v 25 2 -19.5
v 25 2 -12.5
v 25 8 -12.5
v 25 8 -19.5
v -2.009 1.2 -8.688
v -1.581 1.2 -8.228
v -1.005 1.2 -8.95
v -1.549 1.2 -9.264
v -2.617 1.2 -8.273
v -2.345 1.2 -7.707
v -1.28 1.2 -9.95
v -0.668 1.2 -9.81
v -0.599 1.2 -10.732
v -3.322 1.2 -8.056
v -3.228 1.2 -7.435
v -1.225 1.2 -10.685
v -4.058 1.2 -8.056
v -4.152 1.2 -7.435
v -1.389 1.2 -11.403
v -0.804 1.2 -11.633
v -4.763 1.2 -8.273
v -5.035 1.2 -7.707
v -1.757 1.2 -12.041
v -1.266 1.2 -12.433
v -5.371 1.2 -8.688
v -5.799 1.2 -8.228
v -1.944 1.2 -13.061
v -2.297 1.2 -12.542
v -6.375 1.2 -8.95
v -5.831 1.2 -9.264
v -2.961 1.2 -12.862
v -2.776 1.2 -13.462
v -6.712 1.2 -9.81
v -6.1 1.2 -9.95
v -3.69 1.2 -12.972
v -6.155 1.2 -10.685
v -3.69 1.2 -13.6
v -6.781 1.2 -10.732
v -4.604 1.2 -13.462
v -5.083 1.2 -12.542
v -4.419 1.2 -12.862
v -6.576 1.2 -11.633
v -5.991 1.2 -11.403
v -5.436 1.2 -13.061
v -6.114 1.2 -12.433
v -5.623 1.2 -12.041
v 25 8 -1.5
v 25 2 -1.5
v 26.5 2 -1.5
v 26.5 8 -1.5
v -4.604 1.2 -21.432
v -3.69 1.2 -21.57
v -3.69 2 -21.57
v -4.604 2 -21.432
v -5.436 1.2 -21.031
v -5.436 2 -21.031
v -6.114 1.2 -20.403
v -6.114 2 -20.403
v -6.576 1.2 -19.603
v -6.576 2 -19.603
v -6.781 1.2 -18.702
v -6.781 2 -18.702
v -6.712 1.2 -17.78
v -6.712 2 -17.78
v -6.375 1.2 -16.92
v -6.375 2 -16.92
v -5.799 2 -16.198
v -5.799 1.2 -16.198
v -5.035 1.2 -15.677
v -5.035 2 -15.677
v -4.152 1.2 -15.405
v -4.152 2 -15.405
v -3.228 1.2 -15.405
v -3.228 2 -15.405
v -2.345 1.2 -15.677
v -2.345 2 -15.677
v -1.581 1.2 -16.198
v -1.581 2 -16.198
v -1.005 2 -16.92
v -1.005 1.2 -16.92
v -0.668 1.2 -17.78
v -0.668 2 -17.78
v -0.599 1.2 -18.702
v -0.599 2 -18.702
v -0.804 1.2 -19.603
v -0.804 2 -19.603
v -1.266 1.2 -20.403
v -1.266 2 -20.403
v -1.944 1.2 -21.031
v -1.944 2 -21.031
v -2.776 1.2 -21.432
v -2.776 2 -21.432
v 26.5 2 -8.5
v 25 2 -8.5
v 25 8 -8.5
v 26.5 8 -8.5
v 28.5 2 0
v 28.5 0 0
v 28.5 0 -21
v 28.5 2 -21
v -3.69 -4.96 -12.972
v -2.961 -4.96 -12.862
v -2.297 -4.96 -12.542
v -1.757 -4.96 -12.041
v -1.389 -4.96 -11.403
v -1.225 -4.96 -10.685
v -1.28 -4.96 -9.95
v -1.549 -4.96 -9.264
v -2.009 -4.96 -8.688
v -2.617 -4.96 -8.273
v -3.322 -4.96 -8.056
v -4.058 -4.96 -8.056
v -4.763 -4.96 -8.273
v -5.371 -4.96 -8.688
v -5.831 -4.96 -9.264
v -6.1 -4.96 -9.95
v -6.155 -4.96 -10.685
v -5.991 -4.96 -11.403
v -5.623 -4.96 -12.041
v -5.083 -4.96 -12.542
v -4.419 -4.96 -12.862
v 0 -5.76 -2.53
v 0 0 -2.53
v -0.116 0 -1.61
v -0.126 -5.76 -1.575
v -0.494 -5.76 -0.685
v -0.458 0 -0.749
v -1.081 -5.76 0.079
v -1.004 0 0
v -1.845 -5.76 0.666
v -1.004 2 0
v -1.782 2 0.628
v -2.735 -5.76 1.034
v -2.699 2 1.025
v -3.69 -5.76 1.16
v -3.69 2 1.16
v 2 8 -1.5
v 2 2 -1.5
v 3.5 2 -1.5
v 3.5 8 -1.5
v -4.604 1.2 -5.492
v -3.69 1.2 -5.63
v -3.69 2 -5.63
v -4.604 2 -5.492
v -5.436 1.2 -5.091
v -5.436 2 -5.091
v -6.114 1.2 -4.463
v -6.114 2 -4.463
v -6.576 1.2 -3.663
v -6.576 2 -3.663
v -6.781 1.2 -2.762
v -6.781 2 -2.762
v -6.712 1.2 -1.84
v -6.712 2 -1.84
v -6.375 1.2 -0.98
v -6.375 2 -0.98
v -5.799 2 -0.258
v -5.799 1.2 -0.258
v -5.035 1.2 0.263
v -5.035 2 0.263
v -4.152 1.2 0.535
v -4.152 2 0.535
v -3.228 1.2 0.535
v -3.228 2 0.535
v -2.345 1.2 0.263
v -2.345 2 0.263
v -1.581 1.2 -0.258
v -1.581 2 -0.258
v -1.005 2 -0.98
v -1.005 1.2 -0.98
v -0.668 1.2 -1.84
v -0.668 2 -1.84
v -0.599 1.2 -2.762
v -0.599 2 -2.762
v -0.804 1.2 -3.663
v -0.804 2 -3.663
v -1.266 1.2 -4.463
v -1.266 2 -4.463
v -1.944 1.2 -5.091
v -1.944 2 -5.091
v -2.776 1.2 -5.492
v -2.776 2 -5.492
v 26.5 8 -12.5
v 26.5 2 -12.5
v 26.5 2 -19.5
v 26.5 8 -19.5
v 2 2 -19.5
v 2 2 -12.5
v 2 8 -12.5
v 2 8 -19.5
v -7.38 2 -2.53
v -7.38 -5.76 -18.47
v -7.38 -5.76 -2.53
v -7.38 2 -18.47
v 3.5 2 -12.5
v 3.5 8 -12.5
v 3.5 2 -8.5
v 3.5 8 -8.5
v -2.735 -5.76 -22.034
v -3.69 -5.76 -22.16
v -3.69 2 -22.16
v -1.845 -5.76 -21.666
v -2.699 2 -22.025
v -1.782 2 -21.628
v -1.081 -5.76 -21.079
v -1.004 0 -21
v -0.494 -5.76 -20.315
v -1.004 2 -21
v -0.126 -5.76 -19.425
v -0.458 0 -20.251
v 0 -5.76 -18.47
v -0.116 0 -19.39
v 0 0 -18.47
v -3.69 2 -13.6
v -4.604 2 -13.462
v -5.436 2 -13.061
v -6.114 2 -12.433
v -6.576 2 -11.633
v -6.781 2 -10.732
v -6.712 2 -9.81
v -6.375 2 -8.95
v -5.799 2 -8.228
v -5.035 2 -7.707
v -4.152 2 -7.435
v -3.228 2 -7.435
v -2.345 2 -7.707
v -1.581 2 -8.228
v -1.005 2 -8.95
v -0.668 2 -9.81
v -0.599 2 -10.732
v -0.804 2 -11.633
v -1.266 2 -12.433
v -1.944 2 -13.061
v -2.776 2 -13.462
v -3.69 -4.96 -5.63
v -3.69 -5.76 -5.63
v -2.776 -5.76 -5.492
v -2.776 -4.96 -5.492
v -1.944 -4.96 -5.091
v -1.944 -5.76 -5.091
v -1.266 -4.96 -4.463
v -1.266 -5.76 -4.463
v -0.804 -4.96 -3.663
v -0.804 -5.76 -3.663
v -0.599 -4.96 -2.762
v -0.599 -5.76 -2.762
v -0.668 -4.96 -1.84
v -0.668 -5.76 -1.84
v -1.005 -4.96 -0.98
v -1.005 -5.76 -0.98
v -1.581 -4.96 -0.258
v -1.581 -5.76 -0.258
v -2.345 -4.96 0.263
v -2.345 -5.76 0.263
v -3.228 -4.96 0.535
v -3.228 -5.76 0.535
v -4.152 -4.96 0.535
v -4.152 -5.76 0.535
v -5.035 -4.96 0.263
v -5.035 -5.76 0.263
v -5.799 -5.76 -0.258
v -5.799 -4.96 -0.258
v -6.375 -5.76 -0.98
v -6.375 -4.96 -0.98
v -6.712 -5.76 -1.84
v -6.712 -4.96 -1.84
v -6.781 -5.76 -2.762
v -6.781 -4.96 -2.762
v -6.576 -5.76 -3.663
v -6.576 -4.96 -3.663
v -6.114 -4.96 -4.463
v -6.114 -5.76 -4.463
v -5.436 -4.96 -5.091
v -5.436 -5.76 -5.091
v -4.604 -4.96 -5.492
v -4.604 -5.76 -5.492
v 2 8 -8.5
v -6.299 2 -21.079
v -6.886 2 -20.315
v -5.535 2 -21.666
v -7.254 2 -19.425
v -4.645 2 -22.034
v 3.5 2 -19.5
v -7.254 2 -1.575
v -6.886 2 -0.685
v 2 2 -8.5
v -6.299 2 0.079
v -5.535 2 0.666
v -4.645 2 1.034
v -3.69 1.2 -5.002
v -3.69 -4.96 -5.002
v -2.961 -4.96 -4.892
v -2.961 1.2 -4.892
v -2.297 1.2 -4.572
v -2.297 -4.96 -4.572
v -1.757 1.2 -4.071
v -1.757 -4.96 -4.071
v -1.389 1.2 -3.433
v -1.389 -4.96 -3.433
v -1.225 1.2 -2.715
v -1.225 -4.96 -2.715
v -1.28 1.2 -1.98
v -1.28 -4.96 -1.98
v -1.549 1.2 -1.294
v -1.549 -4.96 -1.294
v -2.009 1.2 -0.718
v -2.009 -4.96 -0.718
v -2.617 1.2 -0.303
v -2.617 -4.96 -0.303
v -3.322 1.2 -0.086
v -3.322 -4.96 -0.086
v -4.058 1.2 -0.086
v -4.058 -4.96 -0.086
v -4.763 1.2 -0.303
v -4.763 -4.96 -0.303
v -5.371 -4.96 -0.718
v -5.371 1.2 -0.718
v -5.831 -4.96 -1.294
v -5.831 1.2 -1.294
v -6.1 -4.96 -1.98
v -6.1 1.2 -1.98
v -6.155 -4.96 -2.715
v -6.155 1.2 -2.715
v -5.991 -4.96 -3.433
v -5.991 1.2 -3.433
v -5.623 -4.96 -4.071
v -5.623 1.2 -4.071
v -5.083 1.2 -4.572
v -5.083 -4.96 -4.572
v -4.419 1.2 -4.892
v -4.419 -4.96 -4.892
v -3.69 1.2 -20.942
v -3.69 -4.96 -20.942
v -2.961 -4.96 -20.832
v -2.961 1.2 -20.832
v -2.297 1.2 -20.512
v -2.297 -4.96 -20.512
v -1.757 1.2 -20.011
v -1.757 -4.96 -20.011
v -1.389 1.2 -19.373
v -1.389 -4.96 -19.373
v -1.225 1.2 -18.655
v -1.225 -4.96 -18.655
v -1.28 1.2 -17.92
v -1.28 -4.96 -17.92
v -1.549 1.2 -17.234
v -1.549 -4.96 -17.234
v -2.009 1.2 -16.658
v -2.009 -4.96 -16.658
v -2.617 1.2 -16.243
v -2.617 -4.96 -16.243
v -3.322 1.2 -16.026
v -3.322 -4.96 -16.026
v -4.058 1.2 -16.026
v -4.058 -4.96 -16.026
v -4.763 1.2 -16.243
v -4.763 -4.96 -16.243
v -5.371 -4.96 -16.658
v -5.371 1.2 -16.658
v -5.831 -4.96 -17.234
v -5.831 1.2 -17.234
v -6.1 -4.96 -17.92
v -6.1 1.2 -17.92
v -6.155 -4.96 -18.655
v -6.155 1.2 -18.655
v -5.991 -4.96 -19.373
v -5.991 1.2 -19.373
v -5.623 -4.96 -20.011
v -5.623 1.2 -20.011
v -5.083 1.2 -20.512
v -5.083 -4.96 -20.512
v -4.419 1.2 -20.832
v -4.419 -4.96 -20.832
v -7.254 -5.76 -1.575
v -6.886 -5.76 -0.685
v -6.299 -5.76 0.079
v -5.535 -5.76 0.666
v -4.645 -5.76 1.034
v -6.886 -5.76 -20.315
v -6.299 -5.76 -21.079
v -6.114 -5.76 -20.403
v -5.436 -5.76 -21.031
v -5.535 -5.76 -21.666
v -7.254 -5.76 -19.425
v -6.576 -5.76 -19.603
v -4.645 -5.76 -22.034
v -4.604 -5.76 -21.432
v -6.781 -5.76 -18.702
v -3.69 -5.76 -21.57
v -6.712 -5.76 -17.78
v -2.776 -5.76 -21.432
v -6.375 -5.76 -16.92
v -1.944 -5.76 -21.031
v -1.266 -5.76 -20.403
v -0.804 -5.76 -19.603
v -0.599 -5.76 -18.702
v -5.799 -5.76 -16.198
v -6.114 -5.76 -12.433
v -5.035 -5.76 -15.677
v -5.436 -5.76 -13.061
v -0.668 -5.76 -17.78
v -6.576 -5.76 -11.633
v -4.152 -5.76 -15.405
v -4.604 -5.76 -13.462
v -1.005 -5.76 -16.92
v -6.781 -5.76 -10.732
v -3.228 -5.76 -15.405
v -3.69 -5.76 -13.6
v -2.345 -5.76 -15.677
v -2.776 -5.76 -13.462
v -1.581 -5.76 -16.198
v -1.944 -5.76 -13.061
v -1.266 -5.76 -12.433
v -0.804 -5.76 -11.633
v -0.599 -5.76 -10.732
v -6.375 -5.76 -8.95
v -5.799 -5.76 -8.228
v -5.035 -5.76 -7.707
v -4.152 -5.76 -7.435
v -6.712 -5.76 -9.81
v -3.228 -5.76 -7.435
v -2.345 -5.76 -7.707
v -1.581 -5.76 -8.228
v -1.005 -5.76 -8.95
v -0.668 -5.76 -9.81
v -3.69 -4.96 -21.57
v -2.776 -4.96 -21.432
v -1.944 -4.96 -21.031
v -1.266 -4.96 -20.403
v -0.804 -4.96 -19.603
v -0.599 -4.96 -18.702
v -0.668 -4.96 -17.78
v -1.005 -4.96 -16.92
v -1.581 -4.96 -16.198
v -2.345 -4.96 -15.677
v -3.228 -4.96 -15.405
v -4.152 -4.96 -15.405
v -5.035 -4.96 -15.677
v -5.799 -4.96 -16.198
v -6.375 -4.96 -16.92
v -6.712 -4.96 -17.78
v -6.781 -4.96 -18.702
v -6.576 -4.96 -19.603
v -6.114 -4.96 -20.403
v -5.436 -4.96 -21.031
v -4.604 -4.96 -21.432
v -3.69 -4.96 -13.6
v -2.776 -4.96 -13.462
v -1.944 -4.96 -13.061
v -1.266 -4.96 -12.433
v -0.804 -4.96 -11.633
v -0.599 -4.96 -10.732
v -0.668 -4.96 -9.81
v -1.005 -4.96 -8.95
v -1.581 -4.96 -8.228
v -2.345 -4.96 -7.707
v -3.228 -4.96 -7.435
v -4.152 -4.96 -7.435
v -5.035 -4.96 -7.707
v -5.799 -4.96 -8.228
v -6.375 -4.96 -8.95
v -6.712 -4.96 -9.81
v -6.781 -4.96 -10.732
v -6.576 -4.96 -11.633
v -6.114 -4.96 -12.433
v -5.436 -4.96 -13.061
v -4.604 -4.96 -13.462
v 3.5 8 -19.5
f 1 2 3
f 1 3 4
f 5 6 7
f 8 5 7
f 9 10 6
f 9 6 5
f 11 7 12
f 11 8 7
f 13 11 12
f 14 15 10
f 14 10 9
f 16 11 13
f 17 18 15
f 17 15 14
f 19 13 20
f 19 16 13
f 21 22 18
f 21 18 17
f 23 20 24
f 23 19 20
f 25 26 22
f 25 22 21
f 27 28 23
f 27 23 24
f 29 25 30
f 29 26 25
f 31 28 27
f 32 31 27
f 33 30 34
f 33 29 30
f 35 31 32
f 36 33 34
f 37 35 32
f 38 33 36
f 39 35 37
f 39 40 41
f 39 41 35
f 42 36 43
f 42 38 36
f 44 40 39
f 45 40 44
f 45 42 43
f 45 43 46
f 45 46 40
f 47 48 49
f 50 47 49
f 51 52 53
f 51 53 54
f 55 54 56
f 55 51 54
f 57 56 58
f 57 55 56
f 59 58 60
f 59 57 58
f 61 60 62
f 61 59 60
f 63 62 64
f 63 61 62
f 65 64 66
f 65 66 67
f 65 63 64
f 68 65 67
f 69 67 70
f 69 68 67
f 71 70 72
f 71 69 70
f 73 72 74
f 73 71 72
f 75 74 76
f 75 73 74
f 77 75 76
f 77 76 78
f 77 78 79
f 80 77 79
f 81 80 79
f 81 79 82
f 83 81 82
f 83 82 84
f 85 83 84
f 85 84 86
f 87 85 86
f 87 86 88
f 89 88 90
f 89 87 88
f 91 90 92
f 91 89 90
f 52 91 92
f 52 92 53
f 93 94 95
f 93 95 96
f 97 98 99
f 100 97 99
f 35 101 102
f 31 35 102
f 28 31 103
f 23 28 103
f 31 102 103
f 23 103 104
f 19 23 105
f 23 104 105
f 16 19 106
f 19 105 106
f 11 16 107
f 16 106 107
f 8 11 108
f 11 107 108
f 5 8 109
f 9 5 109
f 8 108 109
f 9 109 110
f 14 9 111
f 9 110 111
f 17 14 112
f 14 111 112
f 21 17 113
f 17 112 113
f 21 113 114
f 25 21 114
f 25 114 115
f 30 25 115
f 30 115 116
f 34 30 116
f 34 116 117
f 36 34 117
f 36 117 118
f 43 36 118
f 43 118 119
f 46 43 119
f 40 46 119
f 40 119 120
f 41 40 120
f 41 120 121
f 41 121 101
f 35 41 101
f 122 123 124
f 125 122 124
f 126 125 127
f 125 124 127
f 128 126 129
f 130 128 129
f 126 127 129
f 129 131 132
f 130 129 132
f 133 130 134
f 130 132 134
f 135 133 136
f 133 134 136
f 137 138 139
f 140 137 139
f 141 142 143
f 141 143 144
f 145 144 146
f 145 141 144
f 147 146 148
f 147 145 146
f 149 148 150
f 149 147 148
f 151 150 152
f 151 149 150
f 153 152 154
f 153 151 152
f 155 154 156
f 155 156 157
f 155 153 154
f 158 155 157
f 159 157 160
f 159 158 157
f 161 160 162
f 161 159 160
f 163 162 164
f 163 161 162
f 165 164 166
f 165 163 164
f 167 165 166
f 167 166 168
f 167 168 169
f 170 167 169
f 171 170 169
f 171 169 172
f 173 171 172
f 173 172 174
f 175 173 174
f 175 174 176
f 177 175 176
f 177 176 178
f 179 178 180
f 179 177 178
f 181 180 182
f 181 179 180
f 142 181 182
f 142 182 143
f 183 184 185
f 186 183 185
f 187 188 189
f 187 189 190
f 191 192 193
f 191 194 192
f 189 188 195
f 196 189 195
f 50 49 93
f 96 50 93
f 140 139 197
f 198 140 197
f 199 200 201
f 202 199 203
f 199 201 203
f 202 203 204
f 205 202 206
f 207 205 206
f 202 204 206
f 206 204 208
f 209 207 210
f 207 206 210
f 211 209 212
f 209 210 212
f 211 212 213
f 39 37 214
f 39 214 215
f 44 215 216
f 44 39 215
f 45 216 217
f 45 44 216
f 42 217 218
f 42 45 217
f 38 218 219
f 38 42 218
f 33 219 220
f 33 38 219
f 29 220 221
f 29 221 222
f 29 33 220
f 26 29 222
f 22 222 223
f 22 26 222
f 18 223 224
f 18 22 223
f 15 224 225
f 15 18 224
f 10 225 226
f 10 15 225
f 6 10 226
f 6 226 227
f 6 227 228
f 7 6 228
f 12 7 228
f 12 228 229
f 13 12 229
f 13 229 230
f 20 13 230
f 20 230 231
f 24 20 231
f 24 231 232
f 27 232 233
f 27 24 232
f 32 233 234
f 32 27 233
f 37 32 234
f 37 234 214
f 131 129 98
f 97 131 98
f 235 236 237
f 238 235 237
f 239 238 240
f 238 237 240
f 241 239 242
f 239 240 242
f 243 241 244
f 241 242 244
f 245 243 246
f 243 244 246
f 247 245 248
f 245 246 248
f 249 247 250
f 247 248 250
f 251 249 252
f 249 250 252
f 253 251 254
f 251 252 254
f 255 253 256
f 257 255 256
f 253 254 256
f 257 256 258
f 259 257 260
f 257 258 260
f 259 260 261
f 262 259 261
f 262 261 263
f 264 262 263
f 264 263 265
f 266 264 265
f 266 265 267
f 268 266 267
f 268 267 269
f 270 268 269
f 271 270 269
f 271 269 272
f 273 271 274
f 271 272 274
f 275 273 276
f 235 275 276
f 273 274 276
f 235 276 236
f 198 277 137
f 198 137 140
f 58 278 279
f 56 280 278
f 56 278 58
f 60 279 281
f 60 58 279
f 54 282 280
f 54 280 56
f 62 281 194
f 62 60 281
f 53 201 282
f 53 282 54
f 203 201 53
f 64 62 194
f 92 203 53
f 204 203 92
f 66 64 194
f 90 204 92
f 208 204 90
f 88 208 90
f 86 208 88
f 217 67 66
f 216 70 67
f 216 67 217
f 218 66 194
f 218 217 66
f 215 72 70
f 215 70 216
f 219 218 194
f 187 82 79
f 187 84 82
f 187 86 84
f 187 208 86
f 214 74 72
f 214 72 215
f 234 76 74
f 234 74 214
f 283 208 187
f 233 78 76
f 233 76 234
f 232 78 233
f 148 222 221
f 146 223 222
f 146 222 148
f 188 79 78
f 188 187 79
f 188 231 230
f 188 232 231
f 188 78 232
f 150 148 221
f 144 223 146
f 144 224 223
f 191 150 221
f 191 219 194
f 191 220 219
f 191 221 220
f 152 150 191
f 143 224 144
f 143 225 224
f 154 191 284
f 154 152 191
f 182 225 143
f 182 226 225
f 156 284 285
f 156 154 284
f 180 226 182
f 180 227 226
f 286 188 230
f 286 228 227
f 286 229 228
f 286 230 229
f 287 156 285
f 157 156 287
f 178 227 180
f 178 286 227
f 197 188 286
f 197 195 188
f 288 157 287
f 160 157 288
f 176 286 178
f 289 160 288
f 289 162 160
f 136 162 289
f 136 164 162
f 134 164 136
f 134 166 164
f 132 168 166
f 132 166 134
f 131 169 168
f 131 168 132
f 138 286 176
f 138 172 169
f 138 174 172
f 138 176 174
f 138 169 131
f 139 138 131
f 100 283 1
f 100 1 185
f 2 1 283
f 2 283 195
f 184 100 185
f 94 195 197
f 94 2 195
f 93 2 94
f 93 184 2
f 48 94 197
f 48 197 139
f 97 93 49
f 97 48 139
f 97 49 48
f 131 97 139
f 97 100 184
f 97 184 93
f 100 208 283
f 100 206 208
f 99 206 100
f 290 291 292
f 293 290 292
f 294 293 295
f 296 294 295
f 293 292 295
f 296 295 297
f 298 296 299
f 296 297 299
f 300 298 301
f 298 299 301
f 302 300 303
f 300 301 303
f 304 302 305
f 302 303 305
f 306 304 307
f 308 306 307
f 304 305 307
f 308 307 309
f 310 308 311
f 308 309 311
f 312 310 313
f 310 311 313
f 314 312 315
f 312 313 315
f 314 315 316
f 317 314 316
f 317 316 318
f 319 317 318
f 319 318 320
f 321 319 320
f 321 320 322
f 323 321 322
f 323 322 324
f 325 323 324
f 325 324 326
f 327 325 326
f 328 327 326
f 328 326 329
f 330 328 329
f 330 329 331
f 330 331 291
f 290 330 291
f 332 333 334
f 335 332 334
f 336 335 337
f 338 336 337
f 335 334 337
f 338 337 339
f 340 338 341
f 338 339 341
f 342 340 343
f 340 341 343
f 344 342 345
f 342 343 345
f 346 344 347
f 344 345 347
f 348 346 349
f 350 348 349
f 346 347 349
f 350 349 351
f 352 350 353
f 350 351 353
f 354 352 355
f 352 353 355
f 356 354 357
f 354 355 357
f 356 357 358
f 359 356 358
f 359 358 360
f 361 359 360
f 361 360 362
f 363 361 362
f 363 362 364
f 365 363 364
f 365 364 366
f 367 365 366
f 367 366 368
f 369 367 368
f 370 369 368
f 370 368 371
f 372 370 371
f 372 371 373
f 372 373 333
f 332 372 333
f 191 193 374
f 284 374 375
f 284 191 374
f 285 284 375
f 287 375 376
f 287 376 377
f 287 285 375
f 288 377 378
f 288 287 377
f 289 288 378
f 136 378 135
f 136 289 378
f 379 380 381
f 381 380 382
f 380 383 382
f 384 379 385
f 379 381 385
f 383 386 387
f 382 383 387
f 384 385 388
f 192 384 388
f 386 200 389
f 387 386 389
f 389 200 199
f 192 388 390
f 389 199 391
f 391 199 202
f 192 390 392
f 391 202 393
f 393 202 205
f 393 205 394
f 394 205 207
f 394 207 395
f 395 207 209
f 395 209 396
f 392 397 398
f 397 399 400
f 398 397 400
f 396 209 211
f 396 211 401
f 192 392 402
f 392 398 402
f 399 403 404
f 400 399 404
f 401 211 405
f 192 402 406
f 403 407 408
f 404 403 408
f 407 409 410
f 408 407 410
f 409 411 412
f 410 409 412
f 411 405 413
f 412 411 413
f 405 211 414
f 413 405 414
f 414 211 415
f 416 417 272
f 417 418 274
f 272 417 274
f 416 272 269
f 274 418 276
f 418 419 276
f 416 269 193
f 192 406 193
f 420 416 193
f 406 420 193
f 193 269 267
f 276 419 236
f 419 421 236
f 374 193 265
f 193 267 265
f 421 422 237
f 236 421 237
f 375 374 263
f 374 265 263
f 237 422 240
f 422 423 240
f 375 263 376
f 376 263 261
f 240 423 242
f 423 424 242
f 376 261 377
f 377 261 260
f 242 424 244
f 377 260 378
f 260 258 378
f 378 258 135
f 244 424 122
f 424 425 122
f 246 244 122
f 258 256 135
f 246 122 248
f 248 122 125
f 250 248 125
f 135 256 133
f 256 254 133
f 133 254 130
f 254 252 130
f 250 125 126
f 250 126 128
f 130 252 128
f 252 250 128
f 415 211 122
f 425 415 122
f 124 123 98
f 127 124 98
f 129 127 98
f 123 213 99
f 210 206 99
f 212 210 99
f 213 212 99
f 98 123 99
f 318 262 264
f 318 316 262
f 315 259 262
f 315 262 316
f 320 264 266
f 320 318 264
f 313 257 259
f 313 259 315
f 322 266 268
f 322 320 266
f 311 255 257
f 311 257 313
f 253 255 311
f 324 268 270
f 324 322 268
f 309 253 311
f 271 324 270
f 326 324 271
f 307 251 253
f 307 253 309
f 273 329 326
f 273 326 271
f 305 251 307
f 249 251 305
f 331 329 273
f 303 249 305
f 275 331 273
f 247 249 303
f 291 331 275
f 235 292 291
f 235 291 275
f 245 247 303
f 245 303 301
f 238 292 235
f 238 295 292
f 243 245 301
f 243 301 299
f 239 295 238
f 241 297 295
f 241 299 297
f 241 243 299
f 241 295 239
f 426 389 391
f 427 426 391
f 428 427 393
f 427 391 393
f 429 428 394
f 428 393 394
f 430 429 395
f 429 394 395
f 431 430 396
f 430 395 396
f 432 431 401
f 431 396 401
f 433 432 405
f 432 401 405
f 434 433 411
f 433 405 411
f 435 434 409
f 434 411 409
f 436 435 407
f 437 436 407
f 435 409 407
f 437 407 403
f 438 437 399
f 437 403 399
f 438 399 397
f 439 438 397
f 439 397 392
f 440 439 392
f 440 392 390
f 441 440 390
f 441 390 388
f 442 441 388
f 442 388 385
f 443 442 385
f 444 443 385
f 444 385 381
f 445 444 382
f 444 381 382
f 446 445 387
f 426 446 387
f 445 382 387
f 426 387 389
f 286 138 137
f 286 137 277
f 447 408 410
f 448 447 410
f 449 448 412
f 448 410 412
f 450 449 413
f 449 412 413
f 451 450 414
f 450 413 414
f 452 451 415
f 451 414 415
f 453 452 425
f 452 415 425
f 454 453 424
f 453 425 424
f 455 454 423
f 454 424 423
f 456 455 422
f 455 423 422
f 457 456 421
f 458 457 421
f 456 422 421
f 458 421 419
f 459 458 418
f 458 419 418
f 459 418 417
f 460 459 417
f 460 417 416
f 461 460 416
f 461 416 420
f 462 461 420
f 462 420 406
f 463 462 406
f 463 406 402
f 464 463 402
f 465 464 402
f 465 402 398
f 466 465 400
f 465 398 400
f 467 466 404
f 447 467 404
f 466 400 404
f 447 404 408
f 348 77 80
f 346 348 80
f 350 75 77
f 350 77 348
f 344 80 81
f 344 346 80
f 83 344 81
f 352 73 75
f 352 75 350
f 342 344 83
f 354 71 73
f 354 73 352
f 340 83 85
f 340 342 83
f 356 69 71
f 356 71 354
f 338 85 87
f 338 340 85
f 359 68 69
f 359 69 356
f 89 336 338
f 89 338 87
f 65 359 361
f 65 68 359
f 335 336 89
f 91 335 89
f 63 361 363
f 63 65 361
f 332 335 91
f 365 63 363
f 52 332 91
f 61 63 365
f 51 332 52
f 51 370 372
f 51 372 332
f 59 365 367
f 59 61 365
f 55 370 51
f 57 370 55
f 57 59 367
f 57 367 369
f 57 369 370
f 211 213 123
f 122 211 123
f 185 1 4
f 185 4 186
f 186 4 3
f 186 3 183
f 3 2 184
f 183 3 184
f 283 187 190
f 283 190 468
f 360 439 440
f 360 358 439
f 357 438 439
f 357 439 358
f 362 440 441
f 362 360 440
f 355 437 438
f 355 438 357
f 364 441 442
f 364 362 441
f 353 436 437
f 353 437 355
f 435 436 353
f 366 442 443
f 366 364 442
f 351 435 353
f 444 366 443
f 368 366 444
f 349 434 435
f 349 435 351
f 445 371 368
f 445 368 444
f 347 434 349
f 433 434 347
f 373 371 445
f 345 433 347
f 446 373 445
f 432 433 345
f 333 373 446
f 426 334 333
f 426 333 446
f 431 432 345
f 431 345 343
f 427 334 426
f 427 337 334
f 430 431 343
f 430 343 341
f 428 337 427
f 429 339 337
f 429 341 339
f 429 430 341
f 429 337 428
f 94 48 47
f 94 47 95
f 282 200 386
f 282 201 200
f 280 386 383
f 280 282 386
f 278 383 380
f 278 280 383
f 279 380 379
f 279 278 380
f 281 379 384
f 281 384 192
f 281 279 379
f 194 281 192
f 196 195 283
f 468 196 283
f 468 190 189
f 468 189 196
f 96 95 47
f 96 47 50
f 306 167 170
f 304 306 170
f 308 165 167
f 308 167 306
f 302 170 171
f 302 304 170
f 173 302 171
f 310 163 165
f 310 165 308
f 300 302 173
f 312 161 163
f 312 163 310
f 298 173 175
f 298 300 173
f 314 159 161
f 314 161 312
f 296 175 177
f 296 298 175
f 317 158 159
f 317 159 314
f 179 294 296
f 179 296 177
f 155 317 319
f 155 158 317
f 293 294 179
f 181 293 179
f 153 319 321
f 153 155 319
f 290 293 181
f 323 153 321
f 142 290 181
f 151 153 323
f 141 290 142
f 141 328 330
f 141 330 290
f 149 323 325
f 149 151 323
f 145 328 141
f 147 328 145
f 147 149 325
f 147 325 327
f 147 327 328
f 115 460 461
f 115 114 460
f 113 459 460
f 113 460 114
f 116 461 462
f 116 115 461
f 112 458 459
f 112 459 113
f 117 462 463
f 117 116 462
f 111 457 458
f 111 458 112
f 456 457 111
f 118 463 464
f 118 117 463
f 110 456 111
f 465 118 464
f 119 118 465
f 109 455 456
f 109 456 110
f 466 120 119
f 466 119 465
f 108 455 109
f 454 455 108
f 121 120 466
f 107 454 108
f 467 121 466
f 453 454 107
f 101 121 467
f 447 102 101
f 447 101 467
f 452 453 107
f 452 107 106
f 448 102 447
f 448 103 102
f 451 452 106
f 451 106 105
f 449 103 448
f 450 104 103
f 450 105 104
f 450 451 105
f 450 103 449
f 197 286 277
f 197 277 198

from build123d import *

# Parameters (mm, degrees)
SKETCH1_W           = 28.5
SKETCH1_H           = 21
BOSS_EXTRUDE1_DEPTH = 2
SKETCH2_W           = 1.5
SKETCH2_H           = 7
BOSS_EXTRUDE2_DEPTH = 6
SKETCH3_W           = 23.32
SKETCH3_H           = 7.76
BOSS_EXTRUDE3_DEPTH = 7.38
SKETCH4_R           = 2.472
CUT_EXTRUDE1_DEPTH  = 7.76
SKETCH5_R           = 3.1
CUT_EXTRUDE2_DEPTH  = 0.8
CUT_EXTRUDE3_START  = -0.8
SKETCH6_R           = 3.1
CUT_EXTRUDE3_DEPTH  = 0.8
FILLET1_R           = 3.69


with BuildPart() as part:
    # Sketch1 → Boss-Extrude1 (new body)
    with BuildSketch(Plane(origin=(0, 0, 0), x_dir=(1, 0, 0), z_dir=(0, 1, 0))):
        with Locations((14.25, 10.5)):
            Rectangle(SKETCH1_W, SKETCH1_H)
    extrude(amount=BOSS_EXTRUDE1_DEPTH)

    # Sketch2 → Boss-Extrude2 (add)
    with BuildSketch(Plane(origin=(0, 2, 0), x_dir=(1, 0, 0), z_dir=(0, 1, 0))):
        with Locations((2.75, 16)):
            Rectangle(SKETCH2_W, SKETCH2_H)
        with Locations((2.75, 5)):
            Rectangle(SKETCH2_W, SKETCH2_H)
        with Locations((25.75, 16)):
            Rectangle(SKETCH2_W, SKETCH2_H)
        with Locations((25.75, 5)):
            Rectangle(SKETCH2_W, SKETCH2_H)
    extrude(amount=BOSS_EXTRUDE2_DEPTH)

    # Sketch3 → Boss-Extrude3 (add)
    with BuildSketch(Plane.ZY):
        with Locations((-10.5, -1.88)):
            Rectangle(SKETCH3_W, SKETCH3_H)
    extrude(amount=BOSS_EXTRUDE3_DEPTH)

    # Sketch4 → Cut-Extrude1 (cut)
    with BuildSketch(Plane.XZ.offset(5.76)):
        with Locations(Location((-3.69, -2.53, 0), (0, 0, 270))):
            Circle(SKETCH4_R)
        with Locations(Location((-3.69, -10.5, 0), (0, 0, 270))):
            Circle(SKETCH4_R)
        with Locations(Location((-3.69, -18.47, 0), (0, 0, 270))):
            Circle(SKETCH4_R)
    extrude(amount=-CUT_EXTRUDE1_DEPTH, mode=Mode.SUBTRACT)

    # Sketch5 → Cut-Extrude2 (cut)
    with BuildSketch(Plane.XZ.offset(5.76)):
        with Locations(Location((-3.69, -2.53, 0), (0, 0, 270))):
            Circle(SKETCH5_R)
        with Locations(Location((-3.69, -10.5, 0), (0, 0, 270))):
            Circle(SKETCH5_R)
        with Locations(Location((-3.69, -18.47, 0), (0, 0, 270))):
            Circle(SKETCH5_R)
    extrude(amount=-CUT_EXTRUDE2_DEPTH, mode=Mode.SUBTRACT)

    # Sketch6 → Cut-Extrude3 (cut)
    with BuildSketch(Plane(origin=(0, 2, 0), x_dir=(1, 0, 0), z_dir=(0, 1, 0)).offset(CUT_EXTRUDE3_START)):
        with Locations(Location((-3.69, 10.5, 0), (0, 0, 90))):
            Circle(SKETCH6_R)
        with Locations(Location((-3.69, 18.47, 0), (0, 0, 90))):
            Circle(SKETCH6_R)
        with Locations(Location((-3.69, 2.53, 0), (0, 0, 90))):
            Circle(SKETCH6_R)
    extrude(amount=CUT_EXTRUDE3_DEPTH, mode=Mode.SUBTRACT)

    # Fillet1
    fillet1_edges = [part.edges().sort_by_distance(p)[0] for p in [
        (-7.38, -1.88, -22.16),
        (0, -1.88, -22.16),
        (0, -1.88, 1.16),
        (-7.38, -1.88, 1.16),
    ]]
    fillet(fillet1_edges, radius=FILLET1_R - 0.0001)  # a hair under: the kernel refuses the full size


solid = part.part
